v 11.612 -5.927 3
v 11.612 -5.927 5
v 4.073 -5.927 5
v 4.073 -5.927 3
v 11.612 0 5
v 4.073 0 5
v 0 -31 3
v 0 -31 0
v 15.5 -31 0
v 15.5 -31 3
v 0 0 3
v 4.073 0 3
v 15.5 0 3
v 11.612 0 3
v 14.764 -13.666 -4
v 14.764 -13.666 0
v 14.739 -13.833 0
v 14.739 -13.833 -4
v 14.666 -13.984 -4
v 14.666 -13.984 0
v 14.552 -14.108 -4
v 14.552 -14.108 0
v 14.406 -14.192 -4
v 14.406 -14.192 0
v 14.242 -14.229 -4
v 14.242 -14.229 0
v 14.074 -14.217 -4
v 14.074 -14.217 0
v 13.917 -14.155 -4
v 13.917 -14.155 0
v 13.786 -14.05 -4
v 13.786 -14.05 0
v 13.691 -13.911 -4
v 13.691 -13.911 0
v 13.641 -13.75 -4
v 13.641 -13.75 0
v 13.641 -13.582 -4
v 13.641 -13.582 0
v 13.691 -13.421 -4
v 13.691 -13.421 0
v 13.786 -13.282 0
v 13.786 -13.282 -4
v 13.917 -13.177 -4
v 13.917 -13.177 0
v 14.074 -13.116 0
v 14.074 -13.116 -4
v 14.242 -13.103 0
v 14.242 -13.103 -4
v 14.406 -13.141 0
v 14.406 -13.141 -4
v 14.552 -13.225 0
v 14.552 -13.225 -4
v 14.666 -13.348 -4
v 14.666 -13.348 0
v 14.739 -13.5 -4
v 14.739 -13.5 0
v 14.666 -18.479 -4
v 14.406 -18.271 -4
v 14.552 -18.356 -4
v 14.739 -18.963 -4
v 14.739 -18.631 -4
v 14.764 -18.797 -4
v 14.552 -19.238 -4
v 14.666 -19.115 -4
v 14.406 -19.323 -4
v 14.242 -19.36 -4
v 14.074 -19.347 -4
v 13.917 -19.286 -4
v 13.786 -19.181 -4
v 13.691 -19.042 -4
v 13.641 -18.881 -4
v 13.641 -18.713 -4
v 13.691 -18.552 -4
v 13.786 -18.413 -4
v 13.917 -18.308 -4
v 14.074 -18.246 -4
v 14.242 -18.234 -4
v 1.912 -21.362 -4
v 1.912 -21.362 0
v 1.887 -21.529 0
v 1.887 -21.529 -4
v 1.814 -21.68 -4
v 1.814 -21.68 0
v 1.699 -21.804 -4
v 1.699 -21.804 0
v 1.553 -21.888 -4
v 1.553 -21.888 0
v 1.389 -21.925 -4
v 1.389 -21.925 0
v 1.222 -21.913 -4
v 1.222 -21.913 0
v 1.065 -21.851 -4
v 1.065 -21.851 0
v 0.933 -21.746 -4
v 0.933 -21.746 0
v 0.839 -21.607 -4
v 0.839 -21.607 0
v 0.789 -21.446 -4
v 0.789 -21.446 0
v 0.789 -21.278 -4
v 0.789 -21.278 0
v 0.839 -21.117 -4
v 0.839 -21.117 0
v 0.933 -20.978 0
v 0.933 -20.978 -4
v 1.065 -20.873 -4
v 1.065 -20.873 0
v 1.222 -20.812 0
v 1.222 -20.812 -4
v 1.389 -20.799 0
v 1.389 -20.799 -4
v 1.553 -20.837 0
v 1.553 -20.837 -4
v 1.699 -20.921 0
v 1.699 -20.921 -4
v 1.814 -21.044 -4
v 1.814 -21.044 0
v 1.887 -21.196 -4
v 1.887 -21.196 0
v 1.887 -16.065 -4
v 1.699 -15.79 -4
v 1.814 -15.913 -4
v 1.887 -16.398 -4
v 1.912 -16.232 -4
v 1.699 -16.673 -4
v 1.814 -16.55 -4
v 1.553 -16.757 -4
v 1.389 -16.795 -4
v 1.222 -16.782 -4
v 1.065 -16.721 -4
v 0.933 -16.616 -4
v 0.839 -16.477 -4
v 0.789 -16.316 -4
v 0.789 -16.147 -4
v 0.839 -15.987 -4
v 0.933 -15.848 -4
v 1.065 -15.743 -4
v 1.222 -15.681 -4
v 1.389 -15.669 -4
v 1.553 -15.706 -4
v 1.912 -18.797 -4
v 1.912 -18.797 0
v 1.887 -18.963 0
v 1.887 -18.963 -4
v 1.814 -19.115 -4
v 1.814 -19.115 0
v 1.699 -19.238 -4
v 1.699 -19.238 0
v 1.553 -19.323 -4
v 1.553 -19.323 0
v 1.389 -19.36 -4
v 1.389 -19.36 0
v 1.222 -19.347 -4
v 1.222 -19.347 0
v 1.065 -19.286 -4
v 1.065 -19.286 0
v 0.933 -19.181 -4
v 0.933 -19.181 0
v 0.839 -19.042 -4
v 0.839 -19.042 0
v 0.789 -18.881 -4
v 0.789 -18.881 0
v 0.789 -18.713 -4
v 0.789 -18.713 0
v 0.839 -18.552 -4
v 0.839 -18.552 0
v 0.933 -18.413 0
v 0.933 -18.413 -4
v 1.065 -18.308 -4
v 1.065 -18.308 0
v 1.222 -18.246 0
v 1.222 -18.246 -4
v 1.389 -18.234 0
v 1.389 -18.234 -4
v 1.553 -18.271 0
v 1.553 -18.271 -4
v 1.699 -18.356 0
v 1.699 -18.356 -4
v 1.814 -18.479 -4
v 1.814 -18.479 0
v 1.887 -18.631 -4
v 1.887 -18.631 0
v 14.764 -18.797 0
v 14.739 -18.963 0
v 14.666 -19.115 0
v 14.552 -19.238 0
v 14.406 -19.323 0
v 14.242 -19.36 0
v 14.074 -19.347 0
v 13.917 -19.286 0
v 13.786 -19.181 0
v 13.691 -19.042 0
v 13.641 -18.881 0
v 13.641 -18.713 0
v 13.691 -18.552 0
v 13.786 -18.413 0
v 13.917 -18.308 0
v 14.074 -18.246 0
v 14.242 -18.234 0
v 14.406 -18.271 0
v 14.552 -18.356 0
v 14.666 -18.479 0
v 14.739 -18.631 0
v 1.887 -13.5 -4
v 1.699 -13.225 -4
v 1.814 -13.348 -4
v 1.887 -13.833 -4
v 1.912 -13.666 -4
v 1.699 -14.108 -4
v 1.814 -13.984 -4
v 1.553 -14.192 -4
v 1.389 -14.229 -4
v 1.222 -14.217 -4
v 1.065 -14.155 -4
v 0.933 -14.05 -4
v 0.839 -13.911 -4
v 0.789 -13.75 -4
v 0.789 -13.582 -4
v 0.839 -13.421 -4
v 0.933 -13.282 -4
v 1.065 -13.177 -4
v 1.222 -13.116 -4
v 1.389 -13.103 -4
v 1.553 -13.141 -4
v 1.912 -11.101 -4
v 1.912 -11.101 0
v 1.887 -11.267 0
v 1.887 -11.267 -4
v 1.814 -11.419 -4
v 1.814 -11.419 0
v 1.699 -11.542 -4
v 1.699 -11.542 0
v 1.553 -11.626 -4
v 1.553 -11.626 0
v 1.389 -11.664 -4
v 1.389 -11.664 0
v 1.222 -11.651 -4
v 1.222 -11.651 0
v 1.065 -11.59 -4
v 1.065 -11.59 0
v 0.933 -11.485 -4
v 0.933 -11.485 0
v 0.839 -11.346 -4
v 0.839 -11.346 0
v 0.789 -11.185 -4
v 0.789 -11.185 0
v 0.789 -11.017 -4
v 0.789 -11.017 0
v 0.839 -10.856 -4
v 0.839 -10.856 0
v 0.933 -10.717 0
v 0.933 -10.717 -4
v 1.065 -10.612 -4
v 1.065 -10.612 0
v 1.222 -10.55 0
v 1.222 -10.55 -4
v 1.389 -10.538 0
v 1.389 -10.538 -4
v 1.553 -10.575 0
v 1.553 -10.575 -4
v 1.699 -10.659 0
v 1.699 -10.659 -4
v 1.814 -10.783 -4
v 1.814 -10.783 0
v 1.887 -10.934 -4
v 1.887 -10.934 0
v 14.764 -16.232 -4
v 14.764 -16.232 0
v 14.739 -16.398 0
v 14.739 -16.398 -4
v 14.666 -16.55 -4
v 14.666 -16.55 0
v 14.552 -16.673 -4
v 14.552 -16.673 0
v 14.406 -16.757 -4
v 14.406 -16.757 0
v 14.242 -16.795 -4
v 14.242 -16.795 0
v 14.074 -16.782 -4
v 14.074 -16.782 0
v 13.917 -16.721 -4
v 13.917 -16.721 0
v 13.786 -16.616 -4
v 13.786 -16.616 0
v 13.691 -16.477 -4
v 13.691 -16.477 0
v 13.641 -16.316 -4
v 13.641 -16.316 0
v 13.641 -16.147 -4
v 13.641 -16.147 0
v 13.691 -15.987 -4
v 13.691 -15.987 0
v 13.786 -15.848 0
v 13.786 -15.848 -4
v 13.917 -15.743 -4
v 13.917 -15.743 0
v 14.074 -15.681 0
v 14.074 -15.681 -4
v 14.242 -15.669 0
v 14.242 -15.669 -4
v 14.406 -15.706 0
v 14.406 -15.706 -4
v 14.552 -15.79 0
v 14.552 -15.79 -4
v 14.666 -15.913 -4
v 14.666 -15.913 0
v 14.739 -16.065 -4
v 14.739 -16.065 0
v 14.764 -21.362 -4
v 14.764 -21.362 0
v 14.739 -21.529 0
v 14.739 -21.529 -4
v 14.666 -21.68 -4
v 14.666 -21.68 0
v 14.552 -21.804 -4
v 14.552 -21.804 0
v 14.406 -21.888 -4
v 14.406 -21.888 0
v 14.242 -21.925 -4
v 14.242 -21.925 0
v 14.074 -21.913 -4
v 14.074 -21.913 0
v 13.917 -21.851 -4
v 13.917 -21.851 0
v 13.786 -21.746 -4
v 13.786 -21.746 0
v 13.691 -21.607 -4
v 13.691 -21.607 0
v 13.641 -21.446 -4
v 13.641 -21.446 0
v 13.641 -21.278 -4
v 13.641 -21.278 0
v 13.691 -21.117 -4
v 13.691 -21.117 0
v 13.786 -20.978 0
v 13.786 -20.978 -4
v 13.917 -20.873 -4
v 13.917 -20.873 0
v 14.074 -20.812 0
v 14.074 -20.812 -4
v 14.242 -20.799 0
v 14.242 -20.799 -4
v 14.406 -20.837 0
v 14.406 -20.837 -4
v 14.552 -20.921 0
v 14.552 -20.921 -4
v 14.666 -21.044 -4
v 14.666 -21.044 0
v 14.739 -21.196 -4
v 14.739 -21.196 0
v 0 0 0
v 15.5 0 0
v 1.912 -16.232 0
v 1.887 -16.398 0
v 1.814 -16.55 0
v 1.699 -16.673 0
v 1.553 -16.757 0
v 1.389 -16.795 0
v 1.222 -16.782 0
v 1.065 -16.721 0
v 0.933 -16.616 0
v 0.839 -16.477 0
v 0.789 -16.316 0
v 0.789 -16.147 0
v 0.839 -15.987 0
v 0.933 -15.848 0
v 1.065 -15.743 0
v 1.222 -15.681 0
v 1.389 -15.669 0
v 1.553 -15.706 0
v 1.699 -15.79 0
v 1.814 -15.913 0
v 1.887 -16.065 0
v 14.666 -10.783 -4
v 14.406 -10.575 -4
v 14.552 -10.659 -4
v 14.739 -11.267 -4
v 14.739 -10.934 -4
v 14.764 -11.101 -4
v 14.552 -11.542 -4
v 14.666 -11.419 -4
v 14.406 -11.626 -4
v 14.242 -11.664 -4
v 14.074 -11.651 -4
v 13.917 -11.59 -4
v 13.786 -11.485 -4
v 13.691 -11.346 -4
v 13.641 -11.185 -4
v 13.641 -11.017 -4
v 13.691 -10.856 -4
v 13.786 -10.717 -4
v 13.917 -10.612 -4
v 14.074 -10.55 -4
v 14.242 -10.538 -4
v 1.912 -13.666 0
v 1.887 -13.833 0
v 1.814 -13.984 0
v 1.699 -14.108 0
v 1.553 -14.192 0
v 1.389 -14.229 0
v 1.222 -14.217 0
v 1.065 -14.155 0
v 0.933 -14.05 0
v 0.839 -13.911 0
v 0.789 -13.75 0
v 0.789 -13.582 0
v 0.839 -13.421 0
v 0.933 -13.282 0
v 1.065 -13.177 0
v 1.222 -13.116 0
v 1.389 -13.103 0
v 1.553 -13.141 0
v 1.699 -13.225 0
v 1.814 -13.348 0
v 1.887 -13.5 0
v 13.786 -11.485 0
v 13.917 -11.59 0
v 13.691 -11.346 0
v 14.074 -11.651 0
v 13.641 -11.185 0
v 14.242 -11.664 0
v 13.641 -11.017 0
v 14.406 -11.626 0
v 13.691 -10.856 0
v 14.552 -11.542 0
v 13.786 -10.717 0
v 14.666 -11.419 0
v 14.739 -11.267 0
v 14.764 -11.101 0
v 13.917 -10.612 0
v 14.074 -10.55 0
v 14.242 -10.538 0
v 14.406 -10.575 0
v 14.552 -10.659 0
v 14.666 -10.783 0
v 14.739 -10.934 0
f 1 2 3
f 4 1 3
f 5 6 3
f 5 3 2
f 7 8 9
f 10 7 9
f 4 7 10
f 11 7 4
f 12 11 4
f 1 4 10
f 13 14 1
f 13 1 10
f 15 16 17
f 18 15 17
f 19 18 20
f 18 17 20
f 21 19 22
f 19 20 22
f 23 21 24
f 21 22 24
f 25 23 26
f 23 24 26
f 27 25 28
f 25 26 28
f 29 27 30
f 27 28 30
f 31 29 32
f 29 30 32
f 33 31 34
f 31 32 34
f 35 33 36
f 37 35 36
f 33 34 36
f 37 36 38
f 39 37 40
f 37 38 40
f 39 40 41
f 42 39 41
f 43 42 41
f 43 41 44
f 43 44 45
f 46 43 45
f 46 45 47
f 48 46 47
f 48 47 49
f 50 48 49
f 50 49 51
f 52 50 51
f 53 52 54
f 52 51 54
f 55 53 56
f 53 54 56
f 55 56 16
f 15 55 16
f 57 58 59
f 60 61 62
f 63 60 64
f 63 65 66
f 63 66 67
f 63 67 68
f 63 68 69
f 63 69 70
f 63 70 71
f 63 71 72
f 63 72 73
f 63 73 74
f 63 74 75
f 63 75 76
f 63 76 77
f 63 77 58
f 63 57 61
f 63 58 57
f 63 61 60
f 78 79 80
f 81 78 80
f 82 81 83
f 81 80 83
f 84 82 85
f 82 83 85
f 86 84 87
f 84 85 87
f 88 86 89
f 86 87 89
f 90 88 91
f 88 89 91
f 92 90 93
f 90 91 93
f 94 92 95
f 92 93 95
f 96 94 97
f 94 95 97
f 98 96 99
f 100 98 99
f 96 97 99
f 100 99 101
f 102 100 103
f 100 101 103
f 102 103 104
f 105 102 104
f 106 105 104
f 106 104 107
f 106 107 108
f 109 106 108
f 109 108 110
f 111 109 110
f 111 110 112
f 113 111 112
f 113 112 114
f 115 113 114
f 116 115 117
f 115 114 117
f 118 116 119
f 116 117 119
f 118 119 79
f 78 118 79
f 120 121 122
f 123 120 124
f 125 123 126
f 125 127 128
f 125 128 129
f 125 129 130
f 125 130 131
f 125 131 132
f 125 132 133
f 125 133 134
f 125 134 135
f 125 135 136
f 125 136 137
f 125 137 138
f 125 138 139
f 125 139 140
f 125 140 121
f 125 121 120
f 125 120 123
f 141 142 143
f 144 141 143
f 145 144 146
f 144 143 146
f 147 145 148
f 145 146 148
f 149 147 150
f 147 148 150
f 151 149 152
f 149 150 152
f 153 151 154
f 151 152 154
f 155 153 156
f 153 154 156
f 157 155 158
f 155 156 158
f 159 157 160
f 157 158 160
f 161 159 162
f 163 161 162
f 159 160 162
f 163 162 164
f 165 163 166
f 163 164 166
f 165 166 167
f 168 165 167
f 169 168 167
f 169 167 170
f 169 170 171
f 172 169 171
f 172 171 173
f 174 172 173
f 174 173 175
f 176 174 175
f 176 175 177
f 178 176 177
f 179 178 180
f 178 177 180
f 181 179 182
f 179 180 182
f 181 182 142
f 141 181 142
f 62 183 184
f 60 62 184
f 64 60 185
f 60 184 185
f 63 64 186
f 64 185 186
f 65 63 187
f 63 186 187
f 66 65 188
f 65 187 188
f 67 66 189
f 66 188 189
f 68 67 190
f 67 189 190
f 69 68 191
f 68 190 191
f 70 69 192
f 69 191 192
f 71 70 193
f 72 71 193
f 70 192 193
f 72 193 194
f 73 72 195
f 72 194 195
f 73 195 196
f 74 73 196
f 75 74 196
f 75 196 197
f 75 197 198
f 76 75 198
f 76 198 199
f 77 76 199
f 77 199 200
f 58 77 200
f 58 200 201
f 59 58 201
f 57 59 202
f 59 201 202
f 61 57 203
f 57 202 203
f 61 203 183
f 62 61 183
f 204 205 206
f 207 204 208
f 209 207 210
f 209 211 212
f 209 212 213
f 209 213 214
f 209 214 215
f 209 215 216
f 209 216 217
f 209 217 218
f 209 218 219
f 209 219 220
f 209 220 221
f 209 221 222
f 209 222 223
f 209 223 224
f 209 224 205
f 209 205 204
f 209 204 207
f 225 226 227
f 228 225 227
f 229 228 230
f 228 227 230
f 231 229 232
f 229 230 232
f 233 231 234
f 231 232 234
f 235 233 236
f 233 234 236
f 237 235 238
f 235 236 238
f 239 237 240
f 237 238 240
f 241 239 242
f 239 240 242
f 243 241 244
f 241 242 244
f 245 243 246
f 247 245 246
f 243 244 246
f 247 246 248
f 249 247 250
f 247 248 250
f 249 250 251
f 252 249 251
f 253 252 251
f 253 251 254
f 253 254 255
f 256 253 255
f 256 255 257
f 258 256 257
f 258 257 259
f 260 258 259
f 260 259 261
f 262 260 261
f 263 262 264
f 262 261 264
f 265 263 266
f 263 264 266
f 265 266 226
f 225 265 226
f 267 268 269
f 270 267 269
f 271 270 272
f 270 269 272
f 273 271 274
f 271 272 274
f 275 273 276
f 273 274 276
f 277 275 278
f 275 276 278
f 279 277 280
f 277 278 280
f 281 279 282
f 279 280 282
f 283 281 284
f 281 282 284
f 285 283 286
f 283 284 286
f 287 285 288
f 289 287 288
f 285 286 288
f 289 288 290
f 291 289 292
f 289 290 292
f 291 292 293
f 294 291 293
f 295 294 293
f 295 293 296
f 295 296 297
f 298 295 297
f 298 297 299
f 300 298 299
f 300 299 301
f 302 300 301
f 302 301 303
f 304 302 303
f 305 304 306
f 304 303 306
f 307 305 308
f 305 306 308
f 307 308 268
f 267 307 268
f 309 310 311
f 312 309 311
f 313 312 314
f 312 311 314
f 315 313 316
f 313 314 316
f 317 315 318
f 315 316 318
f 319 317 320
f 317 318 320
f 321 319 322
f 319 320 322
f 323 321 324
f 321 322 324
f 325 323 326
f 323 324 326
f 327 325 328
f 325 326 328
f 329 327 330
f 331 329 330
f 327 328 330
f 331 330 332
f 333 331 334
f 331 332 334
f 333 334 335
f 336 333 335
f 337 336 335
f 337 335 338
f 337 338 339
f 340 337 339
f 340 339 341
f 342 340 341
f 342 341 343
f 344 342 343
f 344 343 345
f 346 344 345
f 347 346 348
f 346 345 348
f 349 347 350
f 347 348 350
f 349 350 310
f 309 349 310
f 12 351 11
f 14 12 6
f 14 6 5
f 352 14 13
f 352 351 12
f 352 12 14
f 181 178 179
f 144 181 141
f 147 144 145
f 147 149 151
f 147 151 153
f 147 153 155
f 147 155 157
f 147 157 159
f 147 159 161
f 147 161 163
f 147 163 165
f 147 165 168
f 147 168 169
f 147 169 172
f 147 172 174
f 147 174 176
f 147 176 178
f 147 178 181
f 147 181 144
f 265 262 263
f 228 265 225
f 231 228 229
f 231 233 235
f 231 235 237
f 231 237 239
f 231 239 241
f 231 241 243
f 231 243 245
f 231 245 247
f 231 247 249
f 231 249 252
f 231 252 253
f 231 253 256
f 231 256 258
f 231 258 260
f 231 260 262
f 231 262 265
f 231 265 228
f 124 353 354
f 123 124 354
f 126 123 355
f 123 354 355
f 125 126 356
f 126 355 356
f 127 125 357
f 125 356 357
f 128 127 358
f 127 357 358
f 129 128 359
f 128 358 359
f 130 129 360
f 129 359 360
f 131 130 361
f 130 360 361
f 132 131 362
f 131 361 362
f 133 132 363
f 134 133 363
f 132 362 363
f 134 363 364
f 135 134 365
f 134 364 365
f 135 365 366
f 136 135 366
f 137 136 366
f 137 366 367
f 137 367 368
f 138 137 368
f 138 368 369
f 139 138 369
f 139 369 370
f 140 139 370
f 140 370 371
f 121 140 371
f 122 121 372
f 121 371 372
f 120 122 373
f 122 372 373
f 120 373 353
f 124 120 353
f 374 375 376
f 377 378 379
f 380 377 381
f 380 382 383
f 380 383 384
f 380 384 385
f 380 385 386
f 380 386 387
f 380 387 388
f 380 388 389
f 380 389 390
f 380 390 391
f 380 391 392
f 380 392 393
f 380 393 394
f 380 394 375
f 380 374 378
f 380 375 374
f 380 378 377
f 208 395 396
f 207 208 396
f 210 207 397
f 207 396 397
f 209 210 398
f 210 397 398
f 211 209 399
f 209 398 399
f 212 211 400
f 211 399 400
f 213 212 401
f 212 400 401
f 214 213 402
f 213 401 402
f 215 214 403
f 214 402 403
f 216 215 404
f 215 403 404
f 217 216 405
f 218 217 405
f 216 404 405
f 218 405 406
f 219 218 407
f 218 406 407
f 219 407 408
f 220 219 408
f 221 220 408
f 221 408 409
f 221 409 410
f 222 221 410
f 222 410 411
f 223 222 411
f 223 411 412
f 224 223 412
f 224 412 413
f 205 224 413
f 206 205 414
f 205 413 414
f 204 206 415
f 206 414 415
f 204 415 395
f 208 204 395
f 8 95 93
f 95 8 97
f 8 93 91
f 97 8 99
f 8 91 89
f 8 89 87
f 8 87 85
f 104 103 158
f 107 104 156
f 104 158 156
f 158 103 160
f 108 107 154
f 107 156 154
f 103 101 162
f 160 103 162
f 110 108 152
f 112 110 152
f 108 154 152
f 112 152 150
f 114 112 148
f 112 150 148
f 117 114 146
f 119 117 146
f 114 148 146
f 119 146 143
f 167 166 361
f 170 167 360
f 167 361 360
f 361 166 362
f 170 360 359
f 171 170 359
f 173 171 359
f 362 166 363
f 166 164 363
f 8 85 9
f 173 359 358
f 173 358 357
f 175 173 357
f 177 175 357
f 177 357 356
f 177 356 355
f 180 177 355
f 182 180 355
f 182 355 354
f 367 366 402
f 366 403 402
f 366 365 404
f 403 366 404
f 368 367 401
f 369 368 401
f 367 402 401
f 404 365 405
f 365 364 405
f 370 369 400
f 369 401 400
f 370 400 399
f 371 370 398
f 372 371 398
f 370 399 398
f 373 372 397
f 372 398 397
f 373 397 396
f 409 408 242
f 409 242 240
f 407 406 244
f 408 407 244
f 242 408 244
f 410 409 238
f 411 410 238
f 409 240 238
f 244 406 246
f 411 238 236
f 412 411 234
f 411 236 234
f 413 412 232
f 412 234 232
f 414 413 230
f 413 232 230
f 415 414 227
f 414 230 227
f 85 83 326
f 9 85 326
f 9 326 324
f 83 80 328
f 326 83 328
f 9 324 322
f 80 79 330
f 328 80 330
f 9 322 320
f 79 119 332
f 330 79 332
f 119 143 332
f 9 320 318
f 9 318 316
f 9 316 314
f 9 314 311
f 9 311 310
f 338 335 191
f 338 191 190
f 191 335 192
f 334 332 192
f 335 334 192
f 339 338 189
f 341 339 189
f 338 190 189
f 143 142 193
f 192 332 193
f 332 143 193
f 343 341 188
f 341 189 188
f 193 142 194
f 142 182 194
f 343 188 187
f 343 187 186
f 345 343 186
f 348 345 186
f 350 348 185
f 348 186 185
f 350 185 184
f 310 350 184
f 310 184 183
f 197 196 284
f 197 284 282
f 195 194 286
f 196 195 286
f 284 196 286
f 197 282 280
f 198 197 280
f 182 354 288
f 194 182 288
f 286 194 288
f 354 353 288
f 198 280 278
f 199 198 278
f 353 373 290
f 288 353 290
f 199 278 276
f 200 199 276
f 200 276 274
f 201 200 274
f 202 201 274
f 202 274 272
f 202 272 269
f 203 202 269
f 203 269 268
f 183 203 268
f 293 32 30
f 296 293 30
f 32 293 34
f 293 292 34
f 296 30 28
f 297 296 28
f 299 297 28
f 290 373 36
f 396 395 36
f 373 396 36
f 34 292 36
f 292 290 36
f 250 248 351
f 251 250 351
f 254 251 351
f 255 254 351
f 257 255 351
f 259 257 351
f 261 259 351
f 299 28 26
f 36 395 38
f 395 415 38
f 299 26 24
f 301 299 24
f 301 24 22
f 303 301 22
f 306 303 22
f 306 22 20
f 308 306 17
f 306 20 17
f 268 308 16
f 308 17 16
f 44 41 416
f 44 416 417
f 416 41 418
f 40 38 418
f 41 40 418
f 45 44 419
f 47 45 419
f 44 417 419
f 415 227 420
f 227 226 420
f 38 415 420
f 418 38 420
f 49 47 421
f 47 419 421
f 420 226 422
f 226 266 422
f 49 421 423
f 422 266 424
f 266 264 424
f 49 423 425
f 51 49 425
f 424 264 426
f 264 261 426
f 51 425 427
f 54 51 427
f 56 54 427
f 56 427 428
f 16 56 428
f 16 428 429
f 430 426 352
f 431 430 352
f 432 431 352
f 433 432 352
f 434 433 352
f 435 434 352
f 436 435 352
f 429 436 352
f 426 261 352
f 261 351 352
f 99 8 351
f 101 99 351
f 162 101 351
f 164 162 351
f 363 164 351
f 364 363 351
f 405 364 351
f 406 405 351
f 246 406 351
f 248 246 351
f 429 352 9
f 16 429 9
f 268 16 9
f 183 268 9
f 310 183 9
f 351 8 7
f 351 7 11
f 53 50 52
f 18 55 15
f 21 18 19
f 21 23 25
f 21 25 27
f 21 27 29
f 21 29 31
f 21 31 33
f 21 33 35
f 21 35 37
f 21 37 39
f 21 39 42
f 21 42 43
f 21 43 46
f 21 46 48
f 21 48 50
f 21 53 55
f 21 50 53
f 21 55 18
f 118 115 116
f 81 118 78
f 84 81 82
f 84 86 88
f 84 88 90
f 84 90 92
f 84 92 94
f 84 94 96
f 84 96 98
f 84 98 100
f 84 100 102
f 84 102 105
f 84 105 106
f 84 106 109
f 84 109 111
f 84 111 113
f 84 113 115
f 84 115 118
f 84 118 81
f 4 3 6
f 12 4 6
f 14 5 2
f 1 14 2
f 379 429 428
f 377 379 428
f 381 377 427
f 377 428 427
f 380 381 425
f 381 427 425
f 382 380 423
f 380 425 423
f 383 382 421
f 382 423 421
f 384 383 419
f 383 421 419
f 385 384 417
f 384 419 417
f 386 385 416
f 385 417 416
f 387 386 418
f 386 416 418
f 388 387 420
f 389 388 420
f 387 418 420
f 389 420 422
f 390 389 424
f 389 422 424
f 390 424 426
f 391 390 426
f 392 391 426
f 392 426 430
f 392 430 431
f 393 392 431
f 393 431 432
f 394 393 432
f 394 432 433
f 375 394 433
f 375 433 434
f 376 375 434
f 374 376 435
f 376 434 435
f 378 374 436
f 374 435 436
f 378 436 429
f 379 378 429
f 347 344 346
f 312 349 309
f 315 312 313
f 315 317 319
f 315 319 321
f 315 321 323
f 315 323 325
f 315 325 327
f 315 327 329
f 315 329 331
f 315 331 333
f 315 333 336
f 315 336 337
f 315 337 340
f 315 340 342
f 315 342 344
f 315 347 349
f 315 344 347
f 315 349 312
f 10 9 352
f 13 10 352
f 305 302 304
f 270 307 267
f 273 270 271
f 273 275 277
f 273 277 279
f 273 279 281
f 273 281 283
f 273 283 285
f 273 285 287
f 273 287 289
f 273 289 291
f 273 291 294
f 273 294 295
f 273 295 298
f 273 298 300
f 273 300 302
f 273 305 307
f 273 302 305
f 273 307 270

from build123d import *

# Parameters (mm, degrees)
F0_W     = 15.5
F0_H     = 31
F1_DEPTH = 5
F2_R     = 0.564605
F3_DEPTH = 4
F5_DEPTH = 2


with BuildPart() as f1:
    # F0 (on Top) → F1 (new body)
    with BuildSketch(Plane.XY):
        with Locations((7.75, -15.5)):
            Rectangle(F0_W, F0_H)
    extrude(amount=F1_DEPTH)

    # F2 (on face) → F3 (join)
    with BuildSketch(Plane(origin=(0, 0, 0), x_dir=(1, 0, 0), z_dir=(0, 0, -1))):
        with Locations((1.347199, 21.362342)):
            Circle(F2_R)
        with Locations((1.347199, 18.796942)):
            Circle(F2_R)
        with Locations((1.347199, 16.231542)):
            Circle(F2_R)
        with Locations((1.347199, 13.666142)):
            Circle(F2_R)
        with Locations((1.347199, 11.100742)):
            Circle(F2_R)
        with Locations((14.199599, 21.362342)):
            Circle(F2_R)
        with Locations((14.199599, 18.796942)):
            Circle(F2_R)
        with Locations((14.199599, 16.231542)):
            Circle(F2_R)
        with Locations((14.199599, 13.666142)):
            Circle(F2_R)
        with Locations((14.199599, 11.100742)):
            Circle(F2_R)
    extrude(amount=F3_DEPTH)

    # F4 (on face) → F5 (cut)
    with BuildSketch(Plane.XY.offset(5)):
        Polygon((4.07275, -5.926542), (4.07275, 0), (0, 0), (0, -31), (15.5, -31), (15.5, 0), (11.611941, 0), (11.611941, -5.926542), align=None)
    extrude(amount=-F5_DEPTH, mode=Mode.SUBTRACT)


solid = f1.part
